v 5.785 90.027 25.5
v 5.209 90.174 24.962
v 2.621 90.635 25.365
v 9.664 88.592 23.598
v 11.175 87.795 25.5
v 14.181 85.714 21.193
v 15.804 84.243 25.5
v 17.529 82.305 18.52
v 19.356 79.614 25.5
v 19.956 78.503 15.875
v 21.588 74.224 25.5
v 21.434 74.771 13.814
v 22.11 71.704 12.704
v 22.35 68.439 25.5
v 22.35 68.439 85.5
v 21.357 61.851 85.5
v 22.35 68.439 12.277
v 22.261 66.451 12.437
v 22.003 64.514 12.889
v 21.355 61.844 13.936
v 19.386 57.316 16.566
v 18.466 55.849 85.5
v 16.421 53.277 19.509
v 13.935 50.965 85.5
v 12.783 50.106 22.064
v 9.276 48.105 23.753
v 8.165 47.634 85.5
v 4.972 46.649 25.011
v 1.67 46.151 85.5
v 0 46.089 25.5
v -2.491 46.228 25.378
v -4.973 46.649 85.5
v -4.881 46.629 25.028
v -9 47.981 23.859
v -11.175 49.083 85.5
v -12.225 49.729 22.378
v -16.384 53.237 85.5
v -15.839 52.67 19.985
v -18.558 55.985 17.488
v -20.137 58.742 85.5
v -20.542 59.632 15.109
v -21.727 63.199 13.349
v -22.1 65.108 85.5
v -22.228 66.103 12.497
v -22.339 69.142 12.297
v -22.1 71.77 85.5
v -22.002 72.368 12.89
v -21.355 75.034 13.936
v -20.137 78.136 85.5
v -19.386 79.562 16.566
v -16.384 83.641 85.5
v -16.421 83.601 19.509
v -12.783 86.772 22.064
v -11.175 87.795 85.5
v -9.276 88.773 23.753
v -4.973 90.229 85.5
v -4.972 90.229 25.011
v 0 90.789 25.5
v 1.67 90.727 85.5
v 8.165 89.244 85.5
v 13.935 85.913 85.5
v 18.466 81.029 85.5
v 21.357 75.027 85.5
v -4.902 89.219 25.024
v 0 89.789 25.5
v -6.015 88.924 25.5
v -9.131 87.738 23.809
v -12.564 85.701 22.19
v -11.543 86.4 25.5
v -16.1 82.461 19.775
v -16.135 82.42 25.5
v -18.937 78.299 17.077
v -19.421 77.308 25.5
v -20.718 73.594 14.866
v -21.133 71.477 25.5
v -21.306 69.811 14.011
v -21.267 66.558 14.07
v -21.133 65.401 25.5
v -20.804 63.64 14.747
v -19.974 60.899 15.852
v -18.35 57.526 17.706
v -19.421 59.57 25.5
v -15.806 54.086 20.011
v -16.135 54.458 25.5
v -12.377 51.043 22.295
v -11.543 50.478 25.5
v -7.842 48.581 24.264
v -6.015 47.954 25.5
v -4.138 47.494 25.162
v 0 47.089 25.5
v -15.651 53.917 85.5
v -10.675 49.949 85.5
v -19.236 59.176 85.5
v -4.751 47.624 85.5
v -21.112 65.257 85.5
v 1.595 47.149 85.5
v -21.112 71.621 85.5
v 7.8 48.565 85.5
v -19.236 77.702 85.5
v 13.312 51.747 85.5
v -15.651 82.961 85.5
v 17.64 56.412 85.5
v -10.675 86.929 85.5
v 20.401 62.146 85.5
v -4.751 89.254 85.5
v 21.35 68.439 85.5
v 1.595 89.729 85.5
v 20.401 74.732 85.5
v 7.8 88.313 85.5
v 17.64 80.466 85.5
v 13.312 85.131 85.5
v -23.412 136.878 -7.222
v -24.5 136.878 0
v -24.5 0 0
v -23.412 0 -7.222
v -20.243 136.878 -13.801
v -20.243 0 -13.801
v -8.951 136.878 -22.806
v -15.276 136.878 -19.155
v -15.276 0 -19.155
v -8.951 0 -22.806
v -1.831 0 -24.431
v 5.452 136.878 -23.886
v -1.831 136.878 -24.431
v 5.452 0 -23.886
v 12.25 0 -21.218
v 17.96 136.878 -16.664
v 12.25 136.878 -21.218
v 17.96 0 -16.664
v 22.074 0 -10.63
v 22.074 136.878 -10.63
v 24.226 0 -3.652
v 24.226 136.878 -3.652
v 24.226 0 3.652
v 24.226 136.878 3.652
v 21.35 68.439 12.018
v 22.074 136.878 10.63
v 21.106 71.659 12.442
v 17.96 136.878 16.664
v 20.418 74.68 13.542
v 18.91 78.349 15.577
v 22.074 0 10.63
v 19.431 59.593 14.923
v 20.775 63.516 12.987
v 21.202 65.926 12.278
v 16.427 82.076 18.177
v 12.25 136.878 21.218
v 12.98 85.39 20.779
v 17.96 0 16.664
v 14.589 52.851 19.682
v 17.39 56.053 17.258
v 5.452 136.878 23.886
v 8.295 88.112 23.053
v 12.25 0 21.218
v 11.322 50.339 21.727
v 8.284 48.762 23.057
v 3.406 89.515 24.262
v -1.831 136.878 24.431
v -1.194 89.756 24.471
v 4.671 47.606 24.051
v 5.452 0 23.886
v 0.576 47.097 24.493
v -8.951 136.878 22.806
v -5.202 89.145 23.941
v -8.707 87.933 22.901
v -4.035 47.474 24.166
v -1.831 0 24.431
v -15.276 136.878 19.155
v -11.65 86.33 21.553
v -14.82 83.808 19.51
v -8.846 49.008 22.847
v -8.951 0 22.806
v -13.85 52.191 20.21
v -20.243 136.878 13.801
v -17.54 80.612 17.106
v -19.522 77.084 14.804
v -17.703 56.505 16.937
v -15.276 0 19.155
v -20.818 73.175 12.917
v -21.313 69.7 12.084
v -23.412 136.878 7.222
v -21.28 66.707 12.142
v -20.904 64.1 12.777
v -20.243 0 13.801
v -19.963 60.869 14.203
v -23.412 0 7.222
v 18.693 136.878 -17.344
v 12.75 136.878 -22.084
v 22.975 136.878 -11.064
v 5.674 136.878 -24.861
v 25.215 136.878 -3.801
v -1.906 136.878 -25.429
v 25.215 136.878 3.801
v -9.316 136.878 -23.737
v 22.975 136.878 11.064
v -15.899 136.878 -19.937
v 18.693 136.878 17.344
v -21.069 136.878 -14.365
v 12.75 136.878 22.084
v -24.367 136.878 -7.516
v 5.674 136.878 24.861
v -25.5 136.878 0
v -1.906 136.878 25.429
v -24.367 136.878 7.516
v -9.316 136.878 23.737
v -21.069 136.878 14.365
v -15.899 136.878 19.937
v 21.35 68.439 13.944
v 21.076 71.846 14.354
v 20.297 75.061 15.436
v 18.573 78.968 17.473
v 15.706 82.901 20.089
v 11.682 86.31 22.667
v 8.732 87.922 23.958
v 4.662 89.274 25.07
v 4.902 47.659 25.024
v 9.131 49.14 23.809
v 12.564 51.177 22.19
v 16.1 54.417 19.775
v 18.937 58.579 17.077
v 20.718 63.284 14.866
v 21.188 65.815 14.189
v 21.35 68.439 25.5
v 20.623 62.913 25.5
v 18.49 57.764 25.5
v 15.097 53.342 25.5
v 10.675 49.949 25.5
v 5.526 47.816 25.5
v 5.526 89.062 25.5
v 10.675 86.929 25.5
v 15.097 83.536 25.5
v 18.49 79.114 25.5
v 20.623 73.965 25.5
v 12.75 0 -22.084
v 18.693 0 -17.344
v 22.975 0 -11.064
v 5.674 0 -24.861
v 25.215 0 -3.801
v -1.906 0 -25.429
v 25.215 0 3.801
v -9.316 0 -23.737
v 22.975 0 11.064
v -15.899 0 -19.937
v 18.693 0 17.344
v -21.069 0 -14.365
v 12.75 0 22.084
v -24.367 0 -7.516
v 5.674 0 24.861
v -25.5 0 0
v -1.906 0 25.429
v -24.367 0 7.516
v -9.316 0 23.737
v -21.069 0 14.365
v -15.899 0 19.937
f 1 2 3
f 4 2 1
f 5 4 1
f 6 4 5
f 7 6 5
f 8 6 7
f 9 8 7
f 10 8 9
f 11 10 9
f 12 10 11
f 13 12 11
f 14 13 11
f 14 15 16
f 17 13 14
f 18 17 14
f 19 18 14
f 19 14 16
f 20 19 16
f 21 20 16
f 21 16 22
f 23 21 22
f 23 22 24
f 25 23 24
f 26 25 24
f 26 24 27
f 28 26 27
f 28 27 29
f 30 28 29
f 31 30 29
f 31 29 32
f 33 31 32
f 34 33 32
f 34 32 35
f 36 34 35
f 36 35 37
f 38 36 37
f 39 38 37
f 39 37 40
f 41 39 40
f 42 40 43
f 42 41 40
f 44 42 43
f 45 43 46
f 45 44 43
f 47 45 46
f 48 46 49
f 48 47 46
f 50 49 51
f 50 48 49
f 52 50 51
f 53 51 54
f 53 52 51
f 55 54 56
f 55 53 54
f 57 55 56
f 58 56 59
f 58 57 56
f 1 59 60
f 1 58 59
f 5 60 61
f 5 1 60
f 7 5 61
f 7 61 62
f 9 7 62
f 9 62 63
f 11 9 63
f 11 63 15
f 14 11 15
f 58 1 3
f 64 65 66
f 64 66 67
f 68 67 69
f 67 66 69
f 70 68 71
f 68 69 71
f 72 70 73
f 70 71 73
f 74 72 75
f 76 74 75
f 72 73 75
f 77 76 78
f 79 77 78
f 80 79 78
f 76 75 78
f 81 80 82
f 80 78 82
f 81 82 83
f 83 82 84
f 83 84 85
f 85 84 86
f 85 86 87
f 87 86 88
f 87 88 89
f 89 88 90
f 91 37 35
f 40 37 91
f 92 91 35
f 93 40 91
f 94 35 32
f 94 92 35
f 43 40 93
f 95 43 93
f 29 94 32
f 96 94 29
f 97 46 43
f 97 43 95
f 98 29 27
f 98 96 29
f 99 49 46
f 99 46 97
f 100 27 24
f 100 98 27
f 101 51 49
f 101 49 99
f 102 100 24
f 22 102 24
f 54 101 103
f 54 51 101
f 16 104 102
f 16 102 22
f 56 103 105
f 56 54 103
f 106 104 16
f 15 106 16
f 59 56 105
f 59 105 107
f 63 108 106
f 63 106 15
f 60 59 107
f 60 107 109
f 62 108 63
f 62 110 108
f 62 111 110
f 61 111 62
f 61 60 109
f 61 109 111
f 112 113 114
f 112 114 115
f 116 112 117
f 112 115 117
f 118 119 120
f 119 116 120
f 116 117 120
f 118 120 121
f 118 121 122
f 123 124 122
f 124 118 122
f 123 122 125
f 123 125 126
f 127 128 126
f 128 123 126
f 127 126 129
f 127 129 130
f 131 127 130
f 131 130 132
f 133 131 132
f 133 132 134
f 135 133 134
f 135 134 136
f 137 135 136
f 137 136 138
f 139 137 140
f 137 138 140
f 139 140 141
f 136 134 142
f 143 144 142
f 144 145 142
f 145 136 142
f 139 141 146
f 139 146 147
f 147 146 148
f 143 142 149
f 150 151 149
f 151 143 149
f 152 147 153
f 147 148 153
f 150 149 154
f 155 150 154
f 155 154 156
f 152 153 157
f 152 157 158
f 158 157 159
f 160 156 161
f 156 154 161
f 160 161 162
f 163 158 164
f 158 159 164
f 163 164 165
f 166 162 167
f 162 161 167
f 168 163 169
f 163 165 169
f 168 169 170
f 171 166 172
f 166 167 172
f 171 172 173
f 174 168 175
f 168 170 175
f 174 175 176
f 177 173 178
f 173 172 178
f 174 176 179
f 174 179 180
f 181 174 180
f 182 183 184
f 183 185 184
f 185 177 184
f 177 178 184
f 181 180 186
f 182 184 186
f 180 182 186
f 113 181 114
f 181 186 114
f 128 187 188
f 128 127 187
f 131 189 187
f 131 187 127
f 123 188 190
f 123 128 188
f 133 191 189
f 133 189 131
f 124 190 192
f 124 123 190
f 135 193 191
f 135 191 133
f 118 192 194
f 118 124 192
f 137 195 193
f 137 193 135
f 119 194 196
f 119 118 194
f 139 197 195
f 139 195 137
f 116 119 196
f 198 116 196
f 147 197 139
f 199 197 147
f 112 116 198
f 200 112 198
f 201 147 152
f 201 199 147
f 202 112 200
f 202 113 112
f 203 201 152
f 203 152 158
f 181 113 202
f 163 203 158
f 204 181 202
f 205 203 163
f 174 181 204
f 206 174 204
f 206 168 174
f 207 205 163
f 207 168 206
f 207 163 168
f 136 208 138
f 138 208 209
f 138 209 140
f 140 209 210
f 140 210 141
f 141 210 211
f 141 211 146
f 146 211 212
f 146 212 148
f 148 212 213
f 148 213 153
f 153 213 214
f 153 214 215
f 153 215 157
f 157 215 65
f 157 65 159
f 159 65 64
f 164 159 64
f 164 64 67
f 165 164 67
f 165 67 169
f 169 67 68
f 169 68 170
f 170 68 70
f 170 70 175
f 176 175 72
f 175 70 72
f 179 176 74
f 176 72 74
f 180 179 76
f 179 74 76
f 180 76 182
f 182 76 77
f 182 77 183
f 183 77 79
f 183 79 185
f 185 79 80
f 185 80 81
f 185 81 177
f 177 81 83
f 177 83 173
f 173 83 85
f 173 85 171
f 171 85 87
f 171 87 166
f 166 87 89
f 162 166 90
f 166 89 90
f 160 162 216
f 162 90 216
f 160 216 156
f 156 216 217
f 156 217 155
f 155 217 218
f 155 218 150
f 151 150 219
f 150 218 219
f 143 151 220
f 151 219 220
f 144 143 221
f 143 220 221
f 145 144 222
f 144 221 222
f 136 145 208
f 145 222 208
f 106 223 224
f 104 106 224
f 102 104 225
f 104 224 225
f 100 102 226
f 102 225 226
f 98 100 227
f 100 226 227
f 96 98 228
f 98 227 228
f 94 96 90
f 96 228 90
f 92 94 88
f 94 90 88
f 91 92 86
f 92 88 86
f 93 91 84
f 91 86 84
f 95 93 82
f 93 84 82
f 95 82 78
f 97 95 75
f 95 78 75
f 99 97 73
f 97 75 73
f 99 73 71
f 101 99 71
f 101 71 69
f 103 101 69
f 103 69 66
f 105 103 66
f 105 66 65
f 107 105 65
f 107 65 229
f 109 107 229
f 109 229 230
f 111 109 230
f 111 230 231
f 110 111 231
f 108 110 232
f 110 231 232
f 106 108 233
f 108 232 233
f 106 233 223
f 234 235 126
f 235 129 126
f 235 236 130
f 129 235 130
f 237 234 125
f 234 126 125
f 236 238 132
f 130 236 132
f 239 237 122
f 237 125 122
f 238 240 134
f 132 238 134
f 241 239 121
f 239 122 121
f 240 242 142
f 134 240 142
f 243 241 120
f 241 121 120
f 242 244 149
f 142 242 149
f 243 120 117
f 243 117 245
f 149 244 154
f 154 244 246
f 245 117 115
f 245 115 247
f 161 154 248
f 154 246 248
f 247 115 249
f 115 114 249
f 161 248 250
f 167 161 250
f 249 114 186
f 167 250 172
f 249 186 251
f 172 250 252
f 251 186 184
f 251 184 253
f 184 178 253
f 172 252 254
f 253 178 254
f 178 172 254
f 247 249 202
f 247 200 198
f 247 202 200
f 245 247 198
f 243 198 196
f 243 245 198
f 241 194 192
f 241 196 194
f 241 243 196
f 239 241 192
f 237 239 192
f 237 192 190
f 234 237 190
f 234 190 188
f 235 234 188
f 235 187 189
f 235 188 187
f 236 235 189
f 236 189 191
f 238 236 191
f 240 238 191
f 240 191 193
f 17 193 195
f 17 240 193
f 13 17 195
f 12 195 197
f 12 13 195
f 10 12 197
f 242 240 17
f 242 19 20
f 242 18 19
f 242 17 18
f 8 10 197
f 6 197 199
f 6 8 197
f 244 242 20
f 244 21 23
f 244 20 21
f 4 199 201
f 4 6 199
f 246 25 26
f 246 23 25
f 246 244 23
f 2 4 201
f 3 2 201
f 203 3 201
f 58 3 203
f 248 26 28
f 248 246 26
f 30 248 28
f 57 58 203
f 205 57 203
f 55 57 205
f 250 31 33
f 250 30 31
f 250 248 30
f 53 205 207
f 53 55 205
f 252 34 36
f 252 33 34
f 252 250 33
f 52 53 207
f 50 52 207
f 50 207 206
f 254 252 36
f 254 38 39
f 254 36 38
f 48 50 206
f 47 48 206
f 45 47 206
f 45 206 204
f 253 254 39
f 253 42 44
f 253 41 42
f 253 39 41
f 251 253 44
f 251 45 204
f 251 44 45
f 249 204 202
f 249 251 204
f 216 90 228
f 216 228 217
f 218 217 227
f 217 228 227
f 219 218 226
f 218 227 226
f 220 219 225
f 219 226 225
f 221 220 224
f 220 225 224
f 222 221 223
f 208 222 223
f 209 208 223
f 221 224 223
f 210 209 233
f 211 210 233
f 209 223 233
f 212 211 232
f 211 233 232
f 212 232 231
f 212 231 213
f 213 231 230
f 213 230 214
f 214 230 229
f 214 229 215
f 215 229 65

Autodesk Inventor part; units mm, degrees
ref_plane "YZ Plane" through (0, 0, 0) normal (1, 0, 0) x (0, 1, 0)
ref_plane "XZ Plane" through (0, 0, 0) normal (0, 1, 0) x (-1, 0, 0)
sketch "Sketch1" plane through (0, 0, 0) normal (0, 1, 0) x (-1, 0, 0)
  circle A0 centre (0, 0) radius 25.5
  circle A1 centre (0, 0) radius 24.5
  dimension "d0" = 51
  dimension "d1" = 49
extrude "Extrusion1" add sketch "Sketch1" along normal blind 136.878
ref_plane "Work Plane1" through (0, 0, 25.5) normal (0, 0, 1) x (1, 0, 0)
sketch "Sketch2" plane through (0, 0, 25.5) normal (0, 0, 1) x (1, 0, 0)
  line L0 (0, 0) -> (28.9243, 0) construction
  line L1 (-25.5, 0) -> (25.5, 0) projected
  circle A0 centre (0, 68.439) radius 21.35
  line L2 (-24.5, 136.878) -> (24.5, 136.878) projected
  dimension "d4" = 42.7
  dimension "d5" = 68.439
  dimension "d18" = 68.439
extrude "Extrusion2" cut sketch "Sketch2" against normal blind 25.4
sketch "Sketch3" plane through (0, 0, 25.5) normal (0, 0, 1) x (1, 0, 0)
  circle A0 centre (0, 68.439) radius 22.35
  line L0 (0, 0) -> (18.5152, 0) construction
  line L1 (24.5, 0) -> (-24.5, 0) projected
  circle A1 centre (0, 68.439) radius 21.35
  dimension "d8" = 68.439
  dimension "d9" = 44.7
  dimension "d10" = 42.7
extrude "Extrusion3" add sketch "Sketch3" along normal blind 60
sketch "Sketch4" plane through (0, 0, 25.5) normal (0, 0, 1) x (1, 0, 0)
  line L0 (0, 0) -> (23.949, 0) construction
  line L1 (24.5, 0) -> (-24.5, 0) projected
  circle A0 centre (0, 68.439) radius 22.35
  circle A1 centre (0, 68.439) radius 21.35
  dimension "d13" = 68.439
  dimension "d14" = 44.7
  dimension "d15" = 42.7
extrude "Extrusion4" add sketch "Sketch4" against normal up to next
equation "\"d5\" = d18"
equation "\"d8\" = d5"
equation "\"d10\" = d4"
equation "\"d13\" = d5"
equation "\"d15\" = d4"
properties part number "51mm nipple"
